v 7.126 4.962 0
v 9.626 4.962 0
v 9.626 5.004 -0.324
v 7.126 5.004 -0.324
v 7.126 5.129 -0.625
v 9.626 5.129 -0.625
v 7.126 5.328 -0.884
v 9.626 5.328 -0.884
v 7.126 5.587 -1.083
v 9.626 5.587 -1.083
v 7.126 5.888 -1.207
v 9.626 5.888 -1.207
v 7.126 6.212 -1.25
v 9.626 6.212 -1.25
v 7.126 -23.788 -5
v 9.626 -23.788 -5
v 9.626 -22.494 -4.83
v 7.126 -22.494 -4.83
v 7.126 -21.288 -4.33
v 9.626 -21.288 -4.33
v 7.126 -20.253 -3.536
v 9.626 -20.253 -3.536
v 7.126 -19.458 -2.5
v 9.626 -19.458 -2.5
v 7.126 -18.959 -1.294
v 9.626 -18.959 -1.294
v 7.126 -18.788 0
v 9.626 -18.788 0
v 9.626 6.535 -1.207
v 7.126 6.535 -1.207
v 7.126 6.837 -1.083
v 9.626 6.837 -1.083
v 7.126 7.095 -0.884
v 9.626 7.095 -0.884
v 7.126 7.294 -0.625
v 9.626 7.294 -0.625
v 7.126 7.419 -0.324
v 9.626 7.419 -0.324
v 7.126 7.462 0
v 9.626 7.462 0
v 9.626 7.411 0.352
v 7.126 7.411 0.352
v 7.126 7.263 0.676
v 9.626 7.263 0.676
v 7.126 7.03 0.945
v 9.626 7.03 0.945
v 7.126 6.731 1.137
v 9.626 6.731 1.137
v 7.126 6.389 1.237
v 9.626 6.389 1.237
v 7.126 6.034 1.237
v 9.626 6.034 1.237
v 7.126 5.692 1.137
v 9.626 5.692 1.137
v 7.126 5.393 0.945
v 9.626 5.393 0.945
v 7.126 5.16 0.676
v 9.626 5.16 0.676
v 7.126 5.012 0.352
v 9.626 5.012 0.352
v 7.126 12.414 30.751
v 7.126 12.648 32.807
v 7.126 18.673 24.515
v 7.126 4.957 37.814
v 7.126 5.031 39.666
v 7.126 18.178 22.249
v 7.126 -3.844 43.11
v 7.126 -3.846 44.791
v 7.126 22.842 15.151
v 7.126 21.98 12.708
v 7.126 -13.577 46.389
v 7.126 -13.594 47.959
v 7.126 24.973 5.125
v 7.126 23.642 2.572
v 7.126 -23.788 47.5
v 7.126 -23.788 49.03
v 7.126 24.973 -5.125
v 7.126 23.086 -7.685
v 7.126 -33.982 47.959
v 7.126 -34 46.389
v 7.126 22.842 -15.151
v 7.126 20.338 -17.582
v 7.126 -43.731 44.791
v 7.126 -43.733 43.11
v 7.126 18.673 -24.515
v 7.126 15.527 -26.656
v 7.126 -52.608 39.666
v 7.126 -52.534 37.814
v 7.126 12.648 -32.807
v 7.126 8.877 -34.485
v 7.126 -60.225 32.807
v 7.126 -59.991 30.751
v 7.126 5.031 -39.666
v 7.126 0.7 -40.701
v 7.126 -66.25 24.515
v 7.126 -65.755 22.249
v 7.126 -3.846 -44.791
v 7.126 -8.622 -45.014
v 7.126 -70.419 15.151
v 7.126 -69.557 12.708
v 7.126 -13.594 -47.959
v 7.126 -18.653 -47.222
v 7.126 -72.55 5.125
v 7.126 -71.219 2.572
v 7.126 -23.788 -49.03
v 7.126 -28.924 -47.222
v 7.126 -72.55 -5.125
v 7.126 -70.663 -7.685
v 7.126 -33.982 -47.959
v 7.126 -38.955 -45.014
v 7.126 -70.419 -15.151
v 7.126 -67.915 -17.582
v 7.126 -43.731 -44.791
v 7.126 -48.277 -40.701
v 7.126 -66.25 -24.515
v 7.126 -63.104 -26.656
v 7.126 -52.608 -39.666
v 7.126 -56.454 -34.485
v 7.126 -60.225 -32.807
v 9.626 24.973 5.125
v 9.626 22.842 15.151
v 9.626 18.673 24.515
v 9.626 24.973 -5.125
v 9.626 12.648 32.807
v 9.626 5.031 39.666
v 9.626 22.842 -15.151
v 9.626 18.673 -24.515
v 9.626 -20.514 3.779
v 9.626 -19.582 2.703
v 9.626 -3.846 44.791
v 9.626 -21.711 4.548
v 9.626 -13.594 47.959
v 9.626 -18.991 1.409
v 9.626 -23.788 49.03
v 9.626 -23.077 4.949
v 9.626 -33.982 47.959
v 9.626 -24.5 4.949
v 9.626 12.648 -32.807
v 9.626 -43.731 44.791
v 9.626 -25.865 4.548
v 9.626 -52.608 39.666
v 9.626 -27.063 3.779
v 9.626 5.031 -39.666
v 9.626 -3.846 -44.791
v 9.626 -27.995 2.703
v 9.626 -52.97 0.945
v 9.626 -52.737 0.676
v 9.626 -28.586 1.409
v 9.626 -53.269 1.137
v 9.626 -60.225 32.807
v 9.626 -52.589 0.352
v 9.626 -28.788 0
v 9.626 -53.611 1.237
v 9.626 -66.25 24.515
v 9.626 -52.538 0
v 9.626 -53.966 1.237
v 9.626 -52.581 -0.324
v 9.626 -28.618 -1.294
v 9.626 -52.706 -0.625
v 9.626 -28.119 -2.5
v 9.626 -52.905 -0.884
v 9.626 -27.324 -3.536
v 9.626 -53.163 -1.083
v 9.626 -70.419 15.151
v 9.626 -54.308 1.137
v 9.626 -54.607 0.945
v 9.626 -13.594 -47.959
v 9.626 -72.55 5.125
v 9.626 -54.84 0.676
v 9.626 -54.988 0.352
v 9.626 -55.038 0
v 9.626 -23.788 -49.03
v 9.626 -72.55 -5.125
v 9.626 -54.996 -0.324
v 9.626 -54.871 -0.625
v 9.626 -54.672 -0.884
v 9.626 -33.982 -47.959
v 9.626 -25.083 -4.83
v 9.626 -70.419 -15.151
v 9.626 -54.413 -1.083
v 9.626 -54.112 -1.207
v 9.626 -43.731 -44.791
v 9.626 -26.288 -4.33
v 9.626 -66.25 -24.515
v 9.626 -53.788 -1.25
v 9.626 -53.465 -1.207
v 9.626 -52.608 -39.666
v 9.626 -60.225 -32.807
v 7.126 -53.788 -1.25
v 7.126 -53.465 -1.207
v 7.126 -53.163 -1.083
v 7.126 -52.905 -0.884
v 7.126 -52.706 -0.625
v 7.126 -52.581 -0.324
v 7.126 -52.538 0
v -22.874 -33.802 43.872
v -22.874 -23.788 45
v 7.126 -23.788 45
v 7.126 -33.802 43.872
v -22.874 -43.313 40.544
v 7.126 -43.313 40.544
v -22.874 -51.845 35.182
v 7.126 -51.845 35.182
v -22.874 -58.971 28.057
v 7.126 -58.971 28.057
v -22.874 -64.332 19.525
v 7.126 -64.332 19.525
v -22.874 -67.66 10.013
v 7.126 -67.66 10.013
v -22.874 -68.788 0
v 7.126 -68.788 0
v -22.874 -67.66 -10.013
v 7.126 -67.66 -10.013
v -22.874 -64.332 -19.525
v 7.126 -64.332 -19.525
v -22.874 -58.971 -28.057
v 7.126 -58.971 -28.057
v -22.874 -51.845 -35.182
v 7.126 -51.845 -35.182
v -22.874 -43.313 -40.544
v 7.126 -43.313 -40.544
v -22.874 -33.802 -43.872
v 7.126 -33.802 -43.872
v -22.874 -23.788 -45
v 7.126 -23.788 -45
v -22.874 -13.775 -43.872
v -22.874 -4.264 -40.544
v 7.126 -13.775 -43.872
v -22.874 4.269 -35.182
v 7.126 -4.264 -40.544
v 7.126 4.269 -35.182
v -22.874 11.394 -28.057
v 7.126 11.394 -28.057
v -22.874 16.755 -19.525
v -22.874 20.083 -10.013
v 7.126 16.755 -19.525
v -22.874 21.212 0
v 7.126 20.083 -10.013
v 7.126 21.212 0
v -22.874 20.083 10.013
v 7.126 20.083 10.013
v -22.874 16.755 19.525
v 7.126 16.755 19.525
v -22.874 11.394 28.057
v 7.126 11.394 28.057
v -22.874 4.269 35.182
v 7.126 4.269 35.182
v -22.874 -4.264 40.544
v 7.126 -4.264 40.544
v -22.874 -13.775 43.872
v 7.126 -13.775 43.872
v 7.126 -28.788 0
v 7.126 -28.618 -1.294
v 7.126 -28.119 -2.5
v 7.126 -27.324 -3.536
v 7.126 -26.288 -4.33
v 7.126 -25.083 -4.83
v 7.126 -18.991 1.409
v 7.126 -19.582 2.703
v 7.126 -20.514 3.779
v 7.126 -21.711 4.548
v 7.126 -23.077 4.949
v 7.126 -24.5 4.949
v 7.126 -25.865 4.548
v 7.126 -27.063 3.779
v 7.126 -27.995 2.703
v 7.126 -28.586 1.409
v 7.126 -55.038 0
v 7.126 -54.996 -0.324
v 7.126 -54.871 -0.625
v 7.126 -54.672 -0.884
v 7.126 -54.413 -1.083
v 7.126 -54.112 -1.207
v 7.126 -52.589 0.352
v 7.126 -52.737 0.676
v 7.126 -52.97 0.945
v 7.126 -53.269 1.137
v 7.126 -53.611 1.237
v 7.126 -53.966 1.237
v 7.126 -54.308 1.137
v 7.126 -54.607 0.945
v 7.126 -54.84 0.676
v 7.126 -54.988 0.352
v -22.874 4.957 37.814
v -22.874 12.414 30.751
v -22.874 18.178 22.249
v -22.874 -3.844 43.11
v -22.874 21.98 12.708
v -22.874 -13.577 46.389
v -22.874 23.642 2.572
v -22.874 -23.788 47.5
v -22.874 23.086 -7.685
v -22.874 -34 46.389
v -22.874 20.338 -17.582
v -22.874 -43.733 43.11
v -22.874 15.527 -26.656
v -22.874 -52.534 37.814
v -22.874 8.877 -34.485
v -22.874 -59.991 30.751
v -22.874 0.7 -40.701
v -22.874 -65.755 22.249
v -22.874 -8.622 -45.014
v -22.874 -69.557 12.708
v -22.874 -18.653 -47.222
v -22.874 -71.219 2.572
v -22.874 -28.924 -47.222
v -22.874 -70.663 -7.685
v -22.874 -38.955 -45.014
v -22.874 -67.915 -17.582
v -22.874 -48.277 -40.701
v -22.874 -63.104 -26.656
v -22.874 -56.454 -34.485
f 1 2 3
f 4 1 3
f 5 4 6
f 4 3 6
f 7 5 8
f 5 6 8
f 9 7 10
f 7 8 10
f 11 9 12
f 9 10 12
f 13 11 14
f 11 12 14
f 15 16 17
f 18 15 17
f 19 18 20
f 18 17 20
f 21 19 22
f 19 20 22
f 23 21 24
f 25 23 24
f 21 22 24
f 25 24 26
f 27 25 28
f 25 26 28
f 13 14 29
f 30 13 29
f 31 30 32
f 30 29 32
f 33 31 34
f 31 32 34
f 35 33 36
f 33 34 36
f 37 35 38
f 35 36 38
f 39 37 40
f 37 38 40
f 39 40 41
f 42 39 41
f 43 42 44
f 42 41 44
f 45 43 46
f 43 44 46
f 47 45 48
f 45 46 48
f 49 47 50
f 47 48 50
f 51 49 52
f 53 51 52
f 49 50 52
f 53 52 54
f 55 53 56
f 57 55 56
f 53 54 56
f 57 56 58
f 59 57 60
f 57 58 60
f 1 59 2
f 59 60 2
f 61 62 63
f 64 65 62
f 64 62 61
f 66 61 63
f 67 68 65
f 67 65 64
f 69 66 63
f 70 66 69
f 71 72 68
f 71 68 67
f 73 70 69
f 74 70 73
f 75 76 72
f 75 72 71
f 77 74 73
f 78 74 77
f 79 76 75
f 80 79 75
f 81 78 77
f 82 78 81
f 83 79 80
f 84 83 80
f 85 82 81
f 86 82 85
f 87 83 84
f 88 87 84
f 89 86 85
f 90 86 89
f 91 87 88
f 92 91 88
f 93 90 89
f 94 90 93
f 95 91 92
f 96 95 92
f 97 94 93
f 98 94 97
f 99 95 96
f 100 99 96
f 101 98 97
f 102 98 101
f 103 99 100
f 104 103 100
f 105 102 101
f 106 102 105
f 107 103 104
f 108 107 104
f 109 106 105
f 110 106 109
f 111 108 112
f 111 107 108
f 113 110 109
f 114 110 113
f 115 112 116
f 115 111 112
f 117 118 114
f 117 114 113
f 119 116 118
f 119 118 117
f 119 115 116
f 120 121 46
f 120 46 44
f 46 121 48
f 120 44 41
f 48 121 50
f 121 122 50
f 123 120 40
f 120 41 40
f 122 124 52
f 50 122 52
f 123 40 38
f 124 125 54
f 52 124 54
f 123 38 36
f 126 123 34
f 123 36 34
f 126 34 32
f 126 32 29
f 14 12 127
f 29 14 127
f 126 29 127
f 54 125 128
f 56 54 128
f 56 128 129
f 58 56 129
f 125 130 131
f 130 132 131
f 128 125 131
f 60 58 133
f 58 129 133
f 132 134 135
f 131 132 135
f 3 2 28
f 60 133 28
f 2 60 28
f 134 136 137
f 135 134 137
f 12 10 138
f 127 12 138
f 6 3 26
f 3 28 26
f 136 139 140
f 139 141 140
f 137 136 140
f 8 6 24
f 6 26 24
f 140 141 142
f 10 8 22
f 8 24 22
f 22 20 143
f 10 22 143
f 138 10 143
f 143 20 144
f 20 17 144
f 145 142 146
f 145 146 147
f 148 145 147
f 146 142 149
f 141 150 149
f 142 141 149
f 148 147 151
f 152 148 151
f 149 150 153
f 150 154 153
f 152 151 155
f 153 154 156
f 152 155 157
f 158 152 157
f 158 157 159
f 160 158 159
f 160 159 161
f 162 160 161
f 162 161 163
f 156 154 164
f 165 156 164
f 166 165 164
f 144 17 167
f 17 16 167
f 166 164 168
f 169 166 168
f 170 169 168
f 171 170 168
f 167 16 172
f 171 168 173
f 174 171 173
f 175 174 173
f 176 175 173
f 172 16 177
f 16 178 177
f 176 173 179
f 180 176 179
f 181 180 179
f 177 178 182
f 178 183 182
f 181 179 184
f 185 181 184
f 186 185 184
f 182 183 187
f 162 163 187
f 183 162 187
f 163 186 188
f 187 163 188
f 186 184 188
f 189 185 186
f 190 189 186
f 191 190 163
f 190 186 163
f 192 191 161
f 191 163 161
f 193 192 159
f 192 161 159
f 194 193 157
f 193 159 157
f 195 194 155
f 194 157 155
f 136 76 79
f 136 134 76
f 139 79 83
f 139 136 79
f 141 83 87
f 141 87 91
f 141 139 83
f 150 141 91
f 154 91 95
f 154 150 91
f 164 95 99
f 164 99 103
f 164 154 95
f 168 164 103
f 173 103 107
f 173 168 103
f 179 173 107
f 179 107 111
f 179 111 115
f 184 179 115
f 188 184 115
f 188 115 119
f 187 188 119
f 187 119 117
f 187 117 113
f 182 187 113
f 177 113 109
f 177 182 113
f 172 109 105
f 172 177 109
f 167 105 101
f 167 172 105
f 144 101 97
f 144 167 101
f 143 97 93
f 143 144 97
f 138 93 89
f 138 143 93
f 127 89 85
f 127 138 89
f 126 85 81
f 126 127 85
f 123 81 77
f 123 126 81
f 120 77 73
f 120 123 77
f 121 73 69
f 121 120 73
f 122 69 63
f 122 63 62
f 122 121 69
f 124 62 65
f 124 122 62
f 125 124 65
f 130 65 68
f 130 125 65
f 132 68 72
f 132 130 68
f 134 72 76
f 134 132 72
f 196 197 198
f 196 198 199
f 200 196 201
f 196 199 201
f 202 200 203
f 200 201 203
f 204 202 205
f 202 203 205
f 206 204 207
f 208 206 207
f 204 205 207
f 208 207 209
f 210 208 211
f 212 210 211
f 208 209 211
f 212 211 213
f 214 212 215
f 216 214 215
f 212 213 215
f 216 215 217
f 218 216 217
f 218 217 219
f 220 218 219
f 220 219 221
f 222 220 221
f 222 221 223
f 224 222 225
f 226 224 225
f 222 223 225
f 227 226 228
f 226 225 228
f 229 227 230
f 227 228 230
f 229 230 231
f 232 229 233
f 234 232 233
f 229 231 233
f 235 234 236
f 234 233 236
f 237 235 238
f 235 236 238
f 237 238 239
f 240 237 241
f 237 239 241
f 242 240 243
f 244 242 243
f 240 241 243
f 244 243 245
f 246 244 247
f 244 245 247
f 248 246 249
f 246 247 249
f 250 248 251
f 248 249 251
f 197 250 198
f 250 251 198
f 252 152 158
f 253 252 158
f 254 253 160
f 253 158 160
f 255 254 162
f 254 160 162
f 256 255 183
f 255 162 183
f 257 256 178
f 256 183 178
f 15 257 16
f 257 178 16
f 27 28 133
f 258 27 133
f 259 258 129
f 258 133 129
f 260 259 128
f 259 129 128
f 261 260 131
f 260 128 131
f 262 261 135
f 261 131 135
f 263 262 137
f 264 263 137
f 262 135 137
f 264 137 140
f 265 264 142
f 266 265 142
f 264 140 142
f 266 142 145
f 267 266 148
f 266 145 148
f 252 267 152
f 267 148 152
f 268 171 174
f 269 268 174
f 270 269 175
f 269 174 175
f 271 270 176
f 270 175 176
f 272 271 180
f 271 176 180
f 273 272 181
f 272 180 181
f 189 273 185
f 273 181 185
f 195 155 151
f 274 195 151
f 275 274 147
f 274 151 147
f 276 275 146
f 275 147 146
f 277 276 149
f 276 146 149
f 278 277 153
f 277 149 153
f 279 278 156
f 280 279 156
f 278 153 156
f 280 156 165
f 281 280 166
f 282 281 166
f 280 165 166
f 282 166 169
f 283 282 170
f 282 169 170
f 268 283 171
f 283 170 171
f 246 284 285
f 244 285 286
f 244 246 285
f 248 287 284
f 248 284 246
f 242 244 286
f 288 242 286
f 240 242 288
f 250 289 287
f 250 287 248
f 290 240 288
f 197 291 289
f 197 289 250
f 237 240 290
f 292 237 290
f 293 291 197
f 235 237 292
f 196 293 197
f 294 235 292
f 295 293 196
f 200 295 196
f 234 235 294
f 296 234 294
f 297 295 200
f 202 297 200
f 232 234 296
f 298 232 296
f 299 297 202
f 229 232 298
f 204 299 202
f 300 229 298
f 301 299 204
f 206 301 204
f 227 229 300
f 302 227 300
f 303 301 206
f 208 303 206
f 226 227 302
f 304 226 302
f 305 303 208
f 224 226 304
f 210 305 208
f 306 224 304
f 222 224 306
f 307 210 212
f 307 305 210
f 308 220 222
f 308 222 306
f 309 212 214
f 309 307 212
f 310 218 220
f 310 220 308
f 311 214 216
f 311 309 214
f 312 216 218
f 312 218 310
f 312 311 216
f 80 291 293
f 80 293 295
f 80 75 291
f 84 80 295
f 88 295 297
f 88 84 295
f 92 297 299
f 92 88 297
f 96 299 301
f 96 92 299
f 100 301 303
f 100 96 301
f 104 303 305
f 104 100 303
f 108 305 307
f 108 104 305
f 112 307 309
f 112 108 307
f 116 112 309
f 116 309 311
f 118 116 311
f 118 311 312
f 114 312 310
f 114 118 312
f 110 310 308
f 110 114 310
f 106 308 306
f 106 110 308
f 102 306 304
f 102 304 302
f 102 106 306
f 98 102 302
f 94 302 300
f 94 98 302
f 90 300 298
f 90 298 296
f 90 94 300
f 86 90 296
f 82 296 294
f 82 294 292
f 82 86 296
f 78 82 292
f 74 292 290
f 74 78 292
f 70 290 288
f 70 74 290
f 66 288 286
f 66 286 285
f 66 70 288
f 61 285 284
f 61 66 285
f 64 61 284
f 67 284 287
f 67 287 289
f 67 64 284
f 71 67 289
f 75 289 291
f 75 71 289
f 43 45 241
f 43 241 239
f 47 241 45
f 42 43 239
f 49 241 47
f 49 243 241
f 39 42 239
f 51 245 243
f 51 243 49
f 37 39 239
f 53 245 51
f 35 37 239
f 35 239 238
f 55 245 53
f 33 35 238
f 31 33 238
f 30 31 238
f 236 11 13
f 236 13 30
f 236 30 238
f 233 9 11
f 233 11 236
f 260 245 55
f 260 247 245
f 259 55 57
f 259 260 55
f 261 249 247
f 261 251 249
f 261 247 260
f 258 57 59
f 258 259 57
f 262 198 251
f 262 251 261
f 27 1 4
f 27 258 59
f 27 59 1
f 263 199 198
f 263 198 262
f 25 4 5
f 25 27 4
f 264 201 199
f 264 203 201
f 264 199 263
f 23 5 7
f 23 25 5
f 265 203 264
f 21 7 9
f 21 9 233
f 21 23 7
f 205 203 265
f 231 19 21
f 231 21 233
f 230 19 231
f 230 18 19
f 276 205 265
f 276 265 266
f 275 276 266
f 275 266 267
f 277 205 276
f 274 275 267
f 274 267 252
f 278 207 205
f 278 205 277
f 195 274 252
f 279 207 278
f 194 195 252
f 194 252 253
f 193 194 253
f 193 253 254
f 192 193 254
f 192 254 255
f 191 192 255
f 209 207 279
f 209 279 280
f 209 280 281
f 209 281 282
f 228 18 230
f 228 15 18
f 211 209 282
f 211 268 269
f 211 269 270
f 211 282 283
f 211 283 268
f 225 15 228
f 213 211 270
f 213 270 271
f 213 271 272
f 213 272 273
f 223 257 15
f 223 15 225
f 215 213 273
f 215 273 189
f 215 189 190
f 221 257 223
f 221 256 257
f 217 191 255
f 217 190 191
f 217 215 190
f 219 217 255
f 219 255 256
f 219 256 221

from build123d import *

# Parameters (mm, degrees)
SKETCH1_W          = 2.5
SKETCH1_H          = 49.03
SKETCH1_W_2        = 30
SKETCH1_H_2        = 2.5
CUT_EXTRUDE1_DEPTH = 10


with BuildPart() as part:
    # Sketch1 → Revolve1 (revolve)
    with BuildSketch(Plane.XY, mode=Mode.PRIVATE) as revolve1_sk:
        with Locations((8.376364172, 0.726593752)):
            Rectangle(SKETCH1_W, SKETCH1_H)
        with Locations((-7.873635828, 22.461593752)):
            Rectangle(SKETCH1_W_2, SKETCH1_H_2)
    revolve(revolve1_sk.sketch.rotate(Axis((7.126364172, -23.788406248, 0), (1, 0, 0)), 90), axis=Axis((7.126364172, -23.788406248, 0), (1, 0, 0)))

    # Sketch2 → Cut-Extrude1 (cut)
    with BuildSketch(Plane(origin=(9.626364172, 0, 0), x_dir=(0, 0, -1), z_dir=(1, 0, 0))):
        with BuildLine():
            Line((0, -23.788406248), (0, -18.788406248))
            ThreePointArc((0, -18.788406248), (-5, -23.788406248), (0, -28.788406248))
            Line((0, -28.788406248), (0, -23.788406248))
        make_face()
        with BuildLine():
            ThreePointArc((5, -23.788406248), (3.535533906, -20.252872342), (0, -18.788406248))
            Line((0, -18.788406248), (0, -23.788406248))
            Line((0, -23.788406248), (5, -23.788406248))
        make_face()
        with BuildLine():
            Line((5, -23.788406248), (0, -23.788406248))
            Line((0, -23.788406248), (0, -28.788406248))
            ThreePointArc((0, -28.788406248), (3.535533906, -27.323940154), (5, -23.788406248))
        make_face()
        with BuildLine():
            ThreePointArc((1.25, -53.788406248), (0.883883476, -52.904522772), (0, -52.538406248))
            Line((0, -52.538406248), (0, -55.038406248))
            ThreePointArc((0, -55.038406248), (0.883883476, -54.672289725), (1.25, -53.788406248))
        make_face()
        with BuildLine():
            Line((0, -55.038406248), (0, -52.538406248))
            ThreePointArc((0, -52.538406248), (-1.25, -53.788406248), (0, -55.038406248))
        make_face()
        with BuildLine():
            ThreePointArc((1.25, 6.211593752), (0.883883476, 7.095477228), (0, 7.461593752))
            Line((0, 7.461593752), (0, 4.961593752))
            ThreePointArc((0, 4.961593752), (0.883883476, 5.327710275), (1.25, 6.211593752))
        make_face()
        with BuildLine():
            Line((0, 4.961593752), (0, 7.461593752))
            ThreePointArc((0, 7.461593752), (-1.25, 6.211593752), (0, 4.961593752))
        make_face()
    extrude(amount=-CUT_EXTRUDE1_DEPTH, mode=Mode.SUBTRACT)


solid = part.part
